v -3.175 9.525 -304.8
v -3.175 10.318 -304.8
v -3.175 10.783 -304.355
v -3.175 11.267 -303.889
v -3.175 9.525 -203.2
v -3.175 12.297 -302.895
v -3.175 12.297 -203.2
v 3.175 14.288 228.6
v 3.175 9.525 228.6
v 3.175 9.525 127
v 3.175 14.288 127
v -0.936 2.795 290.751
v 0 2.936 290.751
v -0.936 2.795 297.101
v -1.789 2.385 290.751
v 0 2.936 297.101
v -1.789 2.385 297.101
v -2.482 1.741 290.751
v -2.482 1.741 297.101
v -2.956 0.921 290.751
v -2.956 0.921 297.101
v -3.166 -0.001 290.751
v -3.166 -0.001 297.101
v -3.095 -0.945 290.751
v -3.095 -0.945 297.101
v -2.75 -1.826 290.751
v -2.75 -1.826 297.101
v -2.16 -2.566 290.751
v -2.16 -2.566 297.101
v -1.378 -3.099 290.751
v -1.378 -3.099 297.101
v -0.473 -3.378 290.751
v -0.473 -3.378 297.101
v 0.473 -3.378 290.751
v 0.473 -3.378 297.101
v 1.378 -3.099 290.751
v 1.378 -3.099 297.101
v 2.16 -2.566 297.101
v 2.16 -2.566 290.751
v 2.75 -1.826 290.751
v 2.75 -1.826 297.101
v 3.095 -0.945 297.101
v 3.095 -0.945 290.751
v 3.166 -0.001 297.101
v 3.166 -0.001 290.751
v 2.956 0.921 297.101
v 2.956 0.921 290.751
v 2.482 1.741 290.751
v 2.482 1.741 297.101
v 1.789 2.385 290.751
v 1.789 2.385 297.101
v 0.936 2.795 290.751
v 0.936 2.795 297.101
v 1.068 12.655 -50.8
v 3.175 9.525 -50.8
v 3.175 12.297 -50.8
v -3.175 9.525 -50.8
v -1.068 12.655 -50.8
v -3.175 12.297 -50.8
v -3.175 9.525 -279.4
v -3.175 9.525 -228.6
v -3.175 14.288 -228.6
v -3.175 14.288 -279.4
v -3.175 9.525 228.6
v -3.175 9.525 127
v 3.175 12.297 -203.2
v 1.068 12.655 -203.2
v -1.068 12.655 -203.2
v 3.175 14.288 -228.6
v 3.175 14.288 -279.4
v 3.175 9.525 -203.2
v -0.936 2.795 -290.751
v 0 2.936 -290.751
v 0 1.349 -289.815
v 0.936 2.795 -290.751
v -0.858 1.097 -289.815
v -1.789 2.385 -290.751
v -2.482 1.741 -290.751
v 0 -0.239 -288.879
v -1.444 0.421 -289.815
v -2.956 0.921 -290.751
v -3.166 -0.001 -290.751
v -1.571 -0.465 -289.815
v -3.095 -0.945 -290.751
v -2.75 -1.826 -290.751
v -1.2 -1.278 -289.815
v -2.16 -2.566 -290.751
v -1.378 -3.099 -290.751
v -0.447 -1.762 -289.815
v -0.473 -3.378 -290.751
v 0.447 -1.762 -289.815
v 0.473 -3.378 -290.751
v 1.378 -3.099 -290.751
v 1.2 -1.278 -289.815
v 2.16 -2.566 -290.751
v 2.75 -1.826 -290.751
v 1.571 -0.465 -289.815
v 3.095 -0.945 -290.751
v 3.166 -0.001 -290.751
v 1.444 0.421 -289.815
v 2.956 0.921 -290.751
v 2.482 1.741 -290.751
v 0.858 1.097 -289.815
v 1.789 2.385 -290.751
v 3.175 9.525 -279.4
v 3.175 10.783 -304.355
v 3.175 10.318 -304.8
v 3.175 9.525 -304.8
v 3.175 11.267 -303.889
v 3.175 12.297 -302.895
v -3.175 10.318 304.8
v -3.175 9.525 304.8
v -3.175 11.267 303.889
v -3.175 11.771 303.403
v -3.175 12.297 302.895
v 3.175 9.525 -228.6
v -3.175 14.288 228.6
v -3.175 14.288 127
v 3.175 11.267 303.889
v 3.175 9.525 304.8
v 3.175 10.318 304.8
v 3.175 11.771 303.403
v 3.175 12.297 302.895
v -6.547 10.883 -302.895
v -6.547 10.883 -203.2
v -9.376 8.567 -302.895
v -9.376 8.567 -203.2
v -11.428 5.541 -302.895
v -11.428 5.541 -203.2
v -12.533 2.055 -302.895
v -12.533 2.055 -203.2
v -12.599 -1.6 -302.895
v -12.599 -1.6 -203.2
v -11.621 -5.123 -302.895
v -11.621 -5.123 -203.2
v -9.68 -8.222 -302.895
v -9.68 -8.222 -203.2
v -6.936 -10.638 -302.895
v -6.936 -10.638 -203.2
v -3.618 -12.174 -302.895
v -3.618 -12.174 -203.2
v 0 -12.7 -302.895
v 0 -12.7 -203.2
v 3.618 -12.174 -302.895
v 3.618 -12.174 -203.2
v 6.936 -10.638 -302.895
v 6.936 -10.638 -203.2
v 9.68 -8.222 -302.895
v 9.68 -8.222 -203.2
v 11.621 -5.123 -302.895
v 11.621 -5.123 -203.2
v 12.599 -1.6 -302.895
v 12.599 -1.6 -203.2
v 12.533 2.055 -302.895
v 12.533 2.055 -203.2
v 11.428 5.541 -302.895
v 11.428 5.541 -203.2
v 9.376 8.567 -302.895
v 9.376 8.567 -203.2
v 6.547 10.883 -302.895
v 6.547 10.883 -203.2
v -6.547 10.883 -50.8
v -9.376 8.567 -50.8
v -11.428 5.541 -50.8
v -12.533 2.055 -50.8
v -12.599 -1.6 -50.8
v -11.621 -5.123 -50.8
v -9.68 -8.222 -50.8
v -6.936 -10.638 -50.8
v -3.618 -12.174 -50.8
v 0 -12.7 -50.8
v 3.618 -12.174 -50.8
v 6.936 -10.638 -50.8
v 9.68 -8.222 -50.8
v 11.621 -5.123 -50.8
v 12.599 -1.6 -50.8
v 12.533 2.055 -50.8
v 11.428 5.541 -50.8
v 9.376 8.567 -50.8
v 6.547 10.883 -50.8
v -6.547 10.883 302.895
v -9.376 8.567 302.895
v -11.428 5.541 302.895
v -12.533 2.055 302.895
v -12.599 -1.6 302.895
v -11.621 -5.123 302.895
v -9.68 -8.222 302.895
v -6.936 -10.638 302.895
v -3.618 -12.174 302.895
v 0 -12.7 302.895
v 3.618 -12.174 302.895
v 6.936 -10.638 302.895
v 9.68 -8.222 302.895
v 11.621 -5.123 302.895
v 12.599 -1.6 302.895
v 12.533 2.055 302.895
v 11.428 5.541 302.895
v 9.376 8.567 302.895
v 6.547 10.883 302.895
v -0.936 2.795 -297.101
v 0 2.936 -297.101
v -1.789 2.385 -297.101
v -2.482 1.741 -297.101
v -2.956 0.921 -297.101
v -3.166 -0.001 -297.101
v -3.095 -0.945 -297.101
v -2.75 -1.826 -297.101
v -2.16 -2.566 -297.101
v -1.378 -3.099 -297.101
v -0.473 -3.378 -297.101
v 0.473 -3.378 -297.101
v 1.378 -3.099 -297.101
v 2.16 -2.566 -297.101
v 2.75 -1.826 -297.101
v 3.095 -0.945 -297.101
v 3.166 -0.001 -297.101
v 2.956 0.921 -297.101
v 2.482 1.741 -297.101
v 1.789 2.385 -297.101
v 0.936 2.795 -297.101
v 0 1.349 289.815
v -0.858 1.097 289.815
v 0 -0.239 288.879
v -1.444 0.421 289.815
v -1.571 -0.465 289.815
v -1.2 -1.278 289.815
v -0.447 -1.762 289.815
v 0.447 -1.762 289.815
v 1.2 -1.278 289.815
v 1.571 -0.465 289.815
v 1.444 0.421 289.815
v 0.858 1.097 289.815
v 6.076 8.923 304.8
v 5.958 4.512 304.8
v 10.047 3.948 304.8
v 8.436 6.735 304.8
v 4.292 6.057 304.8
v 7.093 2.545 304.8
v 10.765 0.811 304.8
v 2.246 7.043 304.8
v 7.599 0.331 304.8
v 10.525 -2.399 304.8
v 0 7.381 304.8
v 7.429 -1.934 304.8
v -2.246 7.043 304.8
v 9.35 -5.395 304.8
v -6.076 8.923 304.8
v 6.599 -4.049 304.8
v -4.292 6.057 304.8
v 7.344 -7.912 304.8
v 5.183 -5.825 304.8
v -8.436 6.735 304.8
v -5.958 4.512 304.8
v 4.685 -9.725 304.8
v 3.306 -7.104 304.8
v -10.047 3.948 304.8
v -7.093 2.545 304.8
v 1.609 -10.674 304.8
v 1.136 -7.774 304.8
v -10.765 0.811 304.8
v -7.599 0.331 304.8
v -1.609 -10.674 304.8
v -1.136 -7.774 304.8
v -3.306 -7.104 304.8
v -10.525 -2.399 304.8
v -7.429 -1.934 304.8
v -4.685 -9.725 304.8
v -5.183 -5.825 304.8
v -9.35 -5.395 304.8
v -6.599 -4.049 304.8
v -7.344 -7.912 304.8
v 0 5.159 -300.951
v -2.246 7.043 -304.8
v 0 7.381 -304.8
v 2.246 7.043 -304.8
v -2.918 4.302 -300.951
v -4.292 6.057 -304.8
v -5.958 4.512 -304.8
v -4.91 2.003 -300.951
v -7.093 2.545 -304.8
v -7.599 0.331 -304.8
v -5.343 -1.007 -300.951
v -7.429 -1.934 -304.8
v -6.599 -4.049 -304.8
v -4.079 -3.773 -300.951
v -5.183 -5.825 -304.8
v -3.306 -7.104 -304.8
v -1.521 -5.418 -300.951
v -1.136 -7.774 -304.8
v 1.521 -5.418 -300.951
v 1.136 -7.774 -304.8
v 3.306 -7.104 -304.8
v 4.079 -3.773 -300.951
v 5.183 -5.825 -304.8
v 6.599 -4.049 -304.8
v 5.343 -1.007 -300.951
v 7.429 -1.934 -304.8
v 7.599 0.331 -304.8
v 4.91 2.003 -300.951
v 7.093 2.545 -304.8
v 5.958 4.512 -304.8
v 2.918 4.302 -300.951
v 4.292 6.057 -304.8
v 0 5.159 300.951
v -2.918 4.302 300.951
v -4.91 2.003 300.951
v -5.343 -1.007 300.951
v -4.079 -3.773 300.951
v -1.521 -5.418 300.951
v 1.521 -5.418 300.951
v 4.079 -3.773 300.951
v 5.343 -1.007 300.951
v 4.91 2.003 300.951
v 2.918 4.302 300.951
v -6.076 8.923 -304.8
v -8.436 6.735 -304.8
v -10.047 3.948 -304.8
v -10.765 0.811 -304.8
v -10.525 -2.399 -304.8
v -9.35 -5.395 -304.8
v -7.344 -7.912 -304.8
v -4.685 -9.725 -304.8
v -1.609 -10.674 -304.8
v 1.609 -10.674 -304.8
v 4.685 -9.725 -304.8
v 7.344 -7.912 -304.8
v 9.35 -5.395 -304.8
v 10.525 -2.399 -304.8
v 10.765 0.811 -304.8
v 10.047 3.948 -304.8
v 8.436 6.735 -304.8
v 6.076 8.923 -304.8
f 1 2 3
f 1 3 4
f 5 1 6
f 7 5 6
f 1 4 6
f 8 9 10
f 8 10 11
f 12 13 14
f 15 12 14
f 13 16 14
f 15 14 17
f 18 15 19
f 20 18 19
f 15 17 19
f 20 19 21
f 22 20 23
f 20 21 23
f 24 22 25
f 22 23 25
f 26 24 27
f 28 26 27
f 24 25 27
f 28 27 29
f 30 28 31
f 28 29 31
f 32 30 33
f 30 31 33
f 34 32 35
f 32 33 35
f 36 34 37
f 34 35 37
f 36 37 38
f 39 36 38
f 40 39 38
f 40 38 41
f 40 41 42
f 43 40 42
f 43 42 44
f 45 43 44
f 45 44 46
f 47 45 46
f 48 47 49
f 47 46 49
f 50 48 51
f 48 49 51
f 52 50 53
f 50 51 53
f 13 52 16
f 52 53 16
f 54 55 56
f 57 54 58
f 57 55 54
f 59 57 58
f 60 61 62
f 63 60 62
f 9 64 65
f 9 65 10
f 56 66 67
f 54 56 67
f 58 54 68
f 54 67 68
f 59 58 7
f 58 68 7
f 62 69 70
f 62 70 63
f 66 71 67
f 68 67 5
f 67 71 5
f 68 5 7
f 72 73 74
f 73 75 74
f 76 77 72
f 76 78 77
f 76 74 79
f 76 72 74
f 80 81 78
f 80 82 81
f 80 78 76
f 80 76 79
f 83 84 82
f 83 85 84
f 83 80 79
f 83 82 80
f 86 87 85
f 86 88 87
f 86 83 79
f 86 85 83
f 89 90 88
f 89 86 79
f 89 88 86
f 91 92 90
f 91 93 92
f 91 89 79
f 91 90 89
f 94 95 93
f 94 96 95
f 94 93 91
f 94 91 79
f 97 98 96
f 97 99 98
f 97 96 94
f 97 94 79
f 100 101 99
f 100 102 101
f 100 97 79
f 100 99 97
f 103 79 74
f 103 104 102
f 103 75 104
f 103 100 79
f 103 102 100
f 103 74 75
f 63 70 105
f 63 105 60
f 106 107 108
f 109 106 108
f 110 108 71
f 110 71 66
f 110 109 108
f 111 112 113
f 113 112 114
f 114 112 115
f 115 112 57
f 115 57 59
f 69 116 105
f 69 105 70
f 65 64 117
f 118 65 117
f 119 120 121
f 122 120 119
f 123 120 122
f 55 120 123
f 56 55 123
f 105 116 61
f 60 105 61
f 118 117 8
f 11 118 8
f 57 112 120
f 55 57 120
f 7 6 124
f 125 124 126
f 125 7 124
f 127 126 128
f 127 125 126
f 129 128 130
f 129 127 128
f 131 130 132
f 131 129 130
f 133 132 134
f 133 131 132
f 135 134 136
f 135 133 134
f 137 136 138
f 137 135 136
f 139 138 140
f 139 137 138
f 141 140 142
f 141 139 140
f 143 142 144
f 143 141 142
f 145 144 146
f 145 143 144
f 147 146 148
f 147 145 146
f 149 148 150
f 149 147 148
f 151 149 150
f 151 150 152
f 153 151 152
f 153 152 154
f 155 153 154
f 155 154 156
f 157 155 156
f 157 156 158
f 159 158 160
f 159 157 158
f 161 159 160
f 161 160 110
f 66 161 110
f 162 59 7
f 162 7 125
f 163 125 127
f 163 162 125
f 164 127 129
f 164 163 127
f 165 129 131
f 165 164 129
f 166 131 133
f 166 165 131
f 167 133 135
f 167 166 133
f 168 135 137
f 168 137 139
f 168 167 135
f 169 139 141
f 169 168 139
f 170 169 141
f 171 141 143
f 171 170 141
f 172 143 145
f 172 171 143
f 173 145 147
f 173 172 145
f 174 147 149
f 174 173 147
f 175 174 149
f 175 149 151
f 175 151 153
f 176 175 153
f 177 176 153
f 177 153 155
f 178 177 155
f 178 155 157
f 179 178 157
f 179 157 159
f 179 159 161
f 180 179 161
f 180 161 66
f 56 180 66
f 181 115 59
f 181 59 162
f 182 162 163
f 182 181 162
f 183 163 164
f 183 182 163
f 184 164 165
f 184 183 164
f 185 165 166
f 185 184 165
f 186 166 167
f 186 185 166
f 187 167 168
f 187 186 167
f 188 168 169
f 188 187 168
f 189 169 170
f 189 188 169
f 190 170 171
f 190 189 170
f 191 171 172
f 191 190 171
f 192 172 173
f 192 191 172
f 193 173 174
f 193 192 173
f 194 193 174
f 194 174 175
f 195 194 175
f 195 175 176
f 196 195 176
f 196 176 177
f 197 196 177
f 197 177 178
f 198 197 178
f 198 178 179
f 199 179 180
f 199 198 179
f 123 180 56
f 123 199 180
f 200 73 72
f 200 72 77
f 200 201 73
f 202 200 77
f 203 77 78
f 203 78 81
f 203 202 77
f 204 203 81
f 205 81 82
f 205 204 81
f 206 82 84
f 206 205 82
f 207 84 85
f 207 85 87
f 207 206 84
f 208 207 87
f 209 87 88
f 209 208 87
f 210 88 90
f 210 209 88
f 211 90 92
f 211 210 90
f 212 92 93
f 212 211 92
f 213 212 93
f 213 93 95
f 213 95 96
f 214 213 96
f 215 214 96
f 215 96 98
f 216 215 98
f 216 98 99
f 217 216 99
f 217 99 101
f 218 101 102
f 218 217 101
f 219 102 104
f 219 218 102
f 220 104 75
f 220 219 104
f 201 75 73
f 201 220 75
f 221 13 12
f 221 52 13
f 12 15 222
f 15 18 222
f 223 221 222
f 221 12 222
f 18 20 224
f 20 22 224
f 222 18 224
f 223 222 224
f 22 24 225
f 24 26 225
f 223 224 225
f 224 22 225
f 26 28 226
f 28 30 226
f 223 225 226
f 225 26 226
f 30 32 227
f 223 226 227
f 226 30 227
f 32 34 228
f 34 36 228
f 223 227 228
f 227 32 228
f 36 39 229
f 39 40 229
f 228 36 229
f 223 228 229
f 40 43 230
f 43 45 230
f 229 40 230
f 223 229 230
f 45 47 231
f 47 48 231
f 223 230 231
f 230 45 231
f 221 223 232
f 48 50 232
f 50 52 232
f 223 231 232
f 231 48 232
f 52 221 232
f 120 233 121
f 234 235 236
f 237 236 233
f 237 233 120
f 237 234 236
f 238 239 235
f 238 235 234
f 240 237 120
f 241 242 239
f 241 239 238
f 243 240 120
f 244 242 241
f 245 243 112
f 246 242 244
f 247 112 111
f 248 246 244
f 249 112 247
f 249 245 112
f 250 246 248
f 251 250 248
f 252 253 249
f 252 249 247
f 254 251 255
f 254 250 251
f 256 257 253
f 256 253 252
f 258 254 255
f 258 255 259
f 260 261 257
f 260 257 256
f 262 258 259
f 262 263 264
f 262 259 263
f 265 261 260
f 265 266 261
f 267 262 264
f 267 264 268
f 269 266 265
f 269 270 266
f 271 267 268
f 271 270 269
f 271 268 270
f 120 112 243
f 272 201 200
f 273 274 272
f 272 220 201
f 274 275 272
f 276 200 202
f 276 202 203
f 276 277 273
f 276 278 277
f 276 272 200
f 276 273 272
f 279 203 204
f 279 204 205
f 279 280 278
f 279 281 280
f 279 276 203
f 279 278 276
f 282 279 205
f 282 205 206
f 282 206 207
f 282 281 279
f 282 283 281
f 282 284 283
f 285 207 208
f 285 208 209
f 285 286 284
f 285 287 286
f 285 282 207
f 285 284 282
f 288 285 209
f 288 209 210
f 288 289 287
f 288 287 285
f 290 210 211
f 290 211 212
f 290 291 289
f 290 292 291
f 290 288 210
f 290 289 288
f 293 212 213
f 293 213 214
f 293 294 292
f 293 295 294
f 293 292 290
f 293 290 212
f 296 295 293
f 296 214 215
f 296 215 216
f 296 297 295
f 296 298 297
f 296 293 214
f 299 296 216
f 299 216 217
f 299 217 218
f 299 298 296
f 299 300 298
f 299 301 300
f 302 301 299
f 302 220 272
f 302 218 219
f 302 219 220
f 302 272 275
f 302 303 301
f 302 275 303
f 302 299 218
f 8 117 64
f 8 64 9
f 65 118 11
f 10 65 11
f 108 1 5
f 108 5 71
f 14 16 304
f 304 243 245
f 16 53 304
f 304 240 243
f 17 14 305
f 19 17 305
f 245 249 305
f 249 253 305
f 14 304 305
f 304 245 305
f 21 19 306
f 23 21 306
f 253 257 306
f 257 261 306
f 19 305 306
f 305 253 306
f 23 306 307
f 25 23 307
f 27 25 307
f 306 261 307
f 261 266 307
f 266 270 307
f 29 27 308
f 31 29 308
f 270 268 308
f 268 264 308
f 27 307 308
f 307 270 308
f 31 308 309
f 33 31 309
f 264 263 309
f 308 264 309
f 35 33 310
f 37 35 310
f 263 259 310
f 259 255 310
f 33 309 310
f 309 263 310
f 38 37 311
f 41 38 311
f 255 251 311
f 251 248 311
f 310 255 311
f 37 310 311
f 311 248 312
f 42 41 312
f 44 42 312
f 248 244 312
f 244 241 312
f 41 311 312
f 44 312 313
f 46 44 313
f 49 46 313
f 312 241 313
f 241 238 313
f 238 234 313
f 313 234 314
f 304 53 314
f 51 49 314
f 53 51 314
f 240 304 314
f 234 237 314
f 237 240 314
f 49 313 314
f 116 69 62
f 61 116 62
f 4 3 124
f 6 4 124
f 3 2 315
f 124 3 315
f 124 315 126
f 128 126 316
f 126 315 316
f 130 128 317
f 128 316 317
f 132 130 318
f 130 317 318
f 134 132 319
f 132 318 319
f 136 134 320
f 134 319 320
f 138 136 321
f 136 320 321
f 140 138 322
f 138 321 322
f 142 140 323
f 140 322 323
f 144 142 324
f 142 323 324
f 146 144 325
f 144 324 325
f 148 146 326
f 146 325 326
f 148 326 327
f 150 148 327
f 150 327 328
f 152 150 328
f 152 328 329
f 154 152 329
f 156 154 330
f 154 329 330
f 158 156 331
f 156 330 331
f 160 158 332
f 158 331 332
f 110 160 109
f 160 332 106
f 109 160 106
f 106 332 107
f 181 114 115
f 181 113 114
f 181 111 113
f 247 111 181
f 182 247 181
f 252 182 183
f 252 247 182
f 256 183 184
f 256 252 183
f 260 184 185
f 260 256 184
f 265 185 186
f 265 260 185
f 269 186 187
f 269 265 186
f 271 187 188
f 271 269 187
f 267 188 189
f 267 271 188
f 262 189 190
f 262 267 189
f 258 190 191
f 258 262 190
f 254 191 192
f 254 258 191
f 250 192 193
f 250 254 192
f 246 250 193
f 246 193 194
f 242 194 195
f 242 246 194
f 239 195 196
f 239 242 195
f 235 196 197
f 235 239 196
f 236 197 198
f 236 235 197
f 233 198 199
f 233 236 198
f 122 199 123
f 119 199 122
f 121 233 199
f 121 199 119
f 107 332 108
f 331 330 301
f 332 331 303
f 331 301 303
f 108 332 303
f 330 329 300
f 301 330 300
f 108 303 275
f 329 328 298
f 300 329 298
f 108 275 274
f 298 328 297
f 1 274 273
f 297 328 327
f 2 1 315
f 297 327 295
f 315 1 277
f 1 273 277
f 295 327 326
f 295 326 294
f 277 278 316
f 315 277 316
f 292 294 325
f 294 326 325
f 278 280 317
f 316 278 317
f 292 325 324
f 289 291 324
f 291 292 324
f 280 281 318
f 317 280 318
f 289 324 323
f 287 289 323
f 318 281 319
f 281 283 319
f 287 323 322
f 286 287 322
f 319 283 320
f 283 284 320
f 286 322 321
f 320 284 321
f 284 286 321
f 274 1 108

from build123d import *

# Parameters (mm, degrees)
SKETCH1_R           = 12.7
EXTRUDE1_DEPTH      = 304.8
CHAMFER1_SIZE       = 1.905
EXTRUDE2_DEPTH      = 306.328708116
EXTRUDE2_DEPTH_BACK = 306.328708116
SKETCH3_W           = 6.35
SKETCH3_H           = 3.175
EXTRUDE3_START      = -203.2
SKETCH1_2_R         = 12.7
EXTRUDE3_DEPTH      = 152.4
SKETCH5_W           = 6.35
SKETCH5_H           = 4.7625
EXTRUDE4_DEPTH      = 101.6
SKETCH6_W           = 6.35
SKETCH6_H           = 4.7625
EXTRUDE5_DEPTH      = 25.4


with BuildPart() as part:
    # Sketch1 → Extrude1 (new, symmetric)
    with BuildSketch(Plane.XY):
        with Locations(Location((0, 0, 0), (0, 0, 180))):
            Circle(SKETCH1_R)
    extrude(amount=EXTRUDE1_DEPTH, both=True)

    # Chamfer1
    chamfer1_edges = [part.edges().sort_by_distance(p)[0] for p in [
        (12.7, 0, -304.8),
        (12.7, 0, 304.8),
    ]]
    chamfer(chamfer1_edges, length=CHAMFER1_SIZE)

    # Sketch3 → Extrude2 (cut, two sides: drawn at the far end of the back side and taken through both)
    with BuildSketch(Plane.XY.offset(-EXTRUDE2_DEPTH_BACK)):
        with Locations((0, 11.1125)):
            Rectangle(SKETCH3_W, SKETCH3_H)
    extrude(amount=EXTRUDE2_DEPTH + EXTRUDE2_DEPTH_BACK, mode=Mode.SUBTRACT)

    # Sketch1<2> → Extrude3 (add)
    with BuildSketch(Plane.XY.offset(EXTRUDE3_START)):
        with Locations(Location((0, 0, 0), (0, 0, 104.477512186))):
            Circle(SKETCH1_2_R)
    extrude(amount=EXTRUDE3_DEPTH)

    # Sketch8 → Cut-Revolve1 (revolve, cut)
    with BuildSketch(Plane(origin=(0, 0, 0), x_dir=(0, 0, -1), z_dir=(1, 0, 0))):
        Polygon((-304.8, -0.238735613), (-288.878930704, -0.238735613), (-290.75103416, 2.936264387), (-297.10103416, 2.936264387), (-304.8, 7.381264387), (-309.984886671, 7.381264387), (-309.984886671, -0.238735613), align=None)
    cut_revolve1 = revolve(axis=Axis((0, -0.238735613, -304.8), (0, 0, 1)), mode=Mode.SUBTRACT)

    # Mirror1: Cut-Revolve1 across plane
    add(cut_revolve1.mirror(Plane.XY), mode=Mode.SUBTRACT)


with BuildPart() as body_2:
    # Sketch5 → Extrude4 (new body)
    with BuildSketch(Plane.XY.offset(228.6)):
        with Locations((0, 11.90625)):
            Rectangle(SKETCH5_W, SKETCH5_H)
    extrude(amount=-EXTRUDE4_DEPTH)


with BuildPart() as body_3:
    # Sketch6 → Extrude5 (new, symmetric)
    with BuildSketch(Plane(origin=(0, 0, -254), x_dir=(-1, 0, 0), z_dir=(0, 0, -1))):
        with Locations((0, 11.90625)):
            Rectangle(SKETCH6_W, SKETCH6_H)
    extrude(amount=EXTRUDE5_DEPTH, both=True)


solid = Compound([part.part, body_2.part, body_3.part])
